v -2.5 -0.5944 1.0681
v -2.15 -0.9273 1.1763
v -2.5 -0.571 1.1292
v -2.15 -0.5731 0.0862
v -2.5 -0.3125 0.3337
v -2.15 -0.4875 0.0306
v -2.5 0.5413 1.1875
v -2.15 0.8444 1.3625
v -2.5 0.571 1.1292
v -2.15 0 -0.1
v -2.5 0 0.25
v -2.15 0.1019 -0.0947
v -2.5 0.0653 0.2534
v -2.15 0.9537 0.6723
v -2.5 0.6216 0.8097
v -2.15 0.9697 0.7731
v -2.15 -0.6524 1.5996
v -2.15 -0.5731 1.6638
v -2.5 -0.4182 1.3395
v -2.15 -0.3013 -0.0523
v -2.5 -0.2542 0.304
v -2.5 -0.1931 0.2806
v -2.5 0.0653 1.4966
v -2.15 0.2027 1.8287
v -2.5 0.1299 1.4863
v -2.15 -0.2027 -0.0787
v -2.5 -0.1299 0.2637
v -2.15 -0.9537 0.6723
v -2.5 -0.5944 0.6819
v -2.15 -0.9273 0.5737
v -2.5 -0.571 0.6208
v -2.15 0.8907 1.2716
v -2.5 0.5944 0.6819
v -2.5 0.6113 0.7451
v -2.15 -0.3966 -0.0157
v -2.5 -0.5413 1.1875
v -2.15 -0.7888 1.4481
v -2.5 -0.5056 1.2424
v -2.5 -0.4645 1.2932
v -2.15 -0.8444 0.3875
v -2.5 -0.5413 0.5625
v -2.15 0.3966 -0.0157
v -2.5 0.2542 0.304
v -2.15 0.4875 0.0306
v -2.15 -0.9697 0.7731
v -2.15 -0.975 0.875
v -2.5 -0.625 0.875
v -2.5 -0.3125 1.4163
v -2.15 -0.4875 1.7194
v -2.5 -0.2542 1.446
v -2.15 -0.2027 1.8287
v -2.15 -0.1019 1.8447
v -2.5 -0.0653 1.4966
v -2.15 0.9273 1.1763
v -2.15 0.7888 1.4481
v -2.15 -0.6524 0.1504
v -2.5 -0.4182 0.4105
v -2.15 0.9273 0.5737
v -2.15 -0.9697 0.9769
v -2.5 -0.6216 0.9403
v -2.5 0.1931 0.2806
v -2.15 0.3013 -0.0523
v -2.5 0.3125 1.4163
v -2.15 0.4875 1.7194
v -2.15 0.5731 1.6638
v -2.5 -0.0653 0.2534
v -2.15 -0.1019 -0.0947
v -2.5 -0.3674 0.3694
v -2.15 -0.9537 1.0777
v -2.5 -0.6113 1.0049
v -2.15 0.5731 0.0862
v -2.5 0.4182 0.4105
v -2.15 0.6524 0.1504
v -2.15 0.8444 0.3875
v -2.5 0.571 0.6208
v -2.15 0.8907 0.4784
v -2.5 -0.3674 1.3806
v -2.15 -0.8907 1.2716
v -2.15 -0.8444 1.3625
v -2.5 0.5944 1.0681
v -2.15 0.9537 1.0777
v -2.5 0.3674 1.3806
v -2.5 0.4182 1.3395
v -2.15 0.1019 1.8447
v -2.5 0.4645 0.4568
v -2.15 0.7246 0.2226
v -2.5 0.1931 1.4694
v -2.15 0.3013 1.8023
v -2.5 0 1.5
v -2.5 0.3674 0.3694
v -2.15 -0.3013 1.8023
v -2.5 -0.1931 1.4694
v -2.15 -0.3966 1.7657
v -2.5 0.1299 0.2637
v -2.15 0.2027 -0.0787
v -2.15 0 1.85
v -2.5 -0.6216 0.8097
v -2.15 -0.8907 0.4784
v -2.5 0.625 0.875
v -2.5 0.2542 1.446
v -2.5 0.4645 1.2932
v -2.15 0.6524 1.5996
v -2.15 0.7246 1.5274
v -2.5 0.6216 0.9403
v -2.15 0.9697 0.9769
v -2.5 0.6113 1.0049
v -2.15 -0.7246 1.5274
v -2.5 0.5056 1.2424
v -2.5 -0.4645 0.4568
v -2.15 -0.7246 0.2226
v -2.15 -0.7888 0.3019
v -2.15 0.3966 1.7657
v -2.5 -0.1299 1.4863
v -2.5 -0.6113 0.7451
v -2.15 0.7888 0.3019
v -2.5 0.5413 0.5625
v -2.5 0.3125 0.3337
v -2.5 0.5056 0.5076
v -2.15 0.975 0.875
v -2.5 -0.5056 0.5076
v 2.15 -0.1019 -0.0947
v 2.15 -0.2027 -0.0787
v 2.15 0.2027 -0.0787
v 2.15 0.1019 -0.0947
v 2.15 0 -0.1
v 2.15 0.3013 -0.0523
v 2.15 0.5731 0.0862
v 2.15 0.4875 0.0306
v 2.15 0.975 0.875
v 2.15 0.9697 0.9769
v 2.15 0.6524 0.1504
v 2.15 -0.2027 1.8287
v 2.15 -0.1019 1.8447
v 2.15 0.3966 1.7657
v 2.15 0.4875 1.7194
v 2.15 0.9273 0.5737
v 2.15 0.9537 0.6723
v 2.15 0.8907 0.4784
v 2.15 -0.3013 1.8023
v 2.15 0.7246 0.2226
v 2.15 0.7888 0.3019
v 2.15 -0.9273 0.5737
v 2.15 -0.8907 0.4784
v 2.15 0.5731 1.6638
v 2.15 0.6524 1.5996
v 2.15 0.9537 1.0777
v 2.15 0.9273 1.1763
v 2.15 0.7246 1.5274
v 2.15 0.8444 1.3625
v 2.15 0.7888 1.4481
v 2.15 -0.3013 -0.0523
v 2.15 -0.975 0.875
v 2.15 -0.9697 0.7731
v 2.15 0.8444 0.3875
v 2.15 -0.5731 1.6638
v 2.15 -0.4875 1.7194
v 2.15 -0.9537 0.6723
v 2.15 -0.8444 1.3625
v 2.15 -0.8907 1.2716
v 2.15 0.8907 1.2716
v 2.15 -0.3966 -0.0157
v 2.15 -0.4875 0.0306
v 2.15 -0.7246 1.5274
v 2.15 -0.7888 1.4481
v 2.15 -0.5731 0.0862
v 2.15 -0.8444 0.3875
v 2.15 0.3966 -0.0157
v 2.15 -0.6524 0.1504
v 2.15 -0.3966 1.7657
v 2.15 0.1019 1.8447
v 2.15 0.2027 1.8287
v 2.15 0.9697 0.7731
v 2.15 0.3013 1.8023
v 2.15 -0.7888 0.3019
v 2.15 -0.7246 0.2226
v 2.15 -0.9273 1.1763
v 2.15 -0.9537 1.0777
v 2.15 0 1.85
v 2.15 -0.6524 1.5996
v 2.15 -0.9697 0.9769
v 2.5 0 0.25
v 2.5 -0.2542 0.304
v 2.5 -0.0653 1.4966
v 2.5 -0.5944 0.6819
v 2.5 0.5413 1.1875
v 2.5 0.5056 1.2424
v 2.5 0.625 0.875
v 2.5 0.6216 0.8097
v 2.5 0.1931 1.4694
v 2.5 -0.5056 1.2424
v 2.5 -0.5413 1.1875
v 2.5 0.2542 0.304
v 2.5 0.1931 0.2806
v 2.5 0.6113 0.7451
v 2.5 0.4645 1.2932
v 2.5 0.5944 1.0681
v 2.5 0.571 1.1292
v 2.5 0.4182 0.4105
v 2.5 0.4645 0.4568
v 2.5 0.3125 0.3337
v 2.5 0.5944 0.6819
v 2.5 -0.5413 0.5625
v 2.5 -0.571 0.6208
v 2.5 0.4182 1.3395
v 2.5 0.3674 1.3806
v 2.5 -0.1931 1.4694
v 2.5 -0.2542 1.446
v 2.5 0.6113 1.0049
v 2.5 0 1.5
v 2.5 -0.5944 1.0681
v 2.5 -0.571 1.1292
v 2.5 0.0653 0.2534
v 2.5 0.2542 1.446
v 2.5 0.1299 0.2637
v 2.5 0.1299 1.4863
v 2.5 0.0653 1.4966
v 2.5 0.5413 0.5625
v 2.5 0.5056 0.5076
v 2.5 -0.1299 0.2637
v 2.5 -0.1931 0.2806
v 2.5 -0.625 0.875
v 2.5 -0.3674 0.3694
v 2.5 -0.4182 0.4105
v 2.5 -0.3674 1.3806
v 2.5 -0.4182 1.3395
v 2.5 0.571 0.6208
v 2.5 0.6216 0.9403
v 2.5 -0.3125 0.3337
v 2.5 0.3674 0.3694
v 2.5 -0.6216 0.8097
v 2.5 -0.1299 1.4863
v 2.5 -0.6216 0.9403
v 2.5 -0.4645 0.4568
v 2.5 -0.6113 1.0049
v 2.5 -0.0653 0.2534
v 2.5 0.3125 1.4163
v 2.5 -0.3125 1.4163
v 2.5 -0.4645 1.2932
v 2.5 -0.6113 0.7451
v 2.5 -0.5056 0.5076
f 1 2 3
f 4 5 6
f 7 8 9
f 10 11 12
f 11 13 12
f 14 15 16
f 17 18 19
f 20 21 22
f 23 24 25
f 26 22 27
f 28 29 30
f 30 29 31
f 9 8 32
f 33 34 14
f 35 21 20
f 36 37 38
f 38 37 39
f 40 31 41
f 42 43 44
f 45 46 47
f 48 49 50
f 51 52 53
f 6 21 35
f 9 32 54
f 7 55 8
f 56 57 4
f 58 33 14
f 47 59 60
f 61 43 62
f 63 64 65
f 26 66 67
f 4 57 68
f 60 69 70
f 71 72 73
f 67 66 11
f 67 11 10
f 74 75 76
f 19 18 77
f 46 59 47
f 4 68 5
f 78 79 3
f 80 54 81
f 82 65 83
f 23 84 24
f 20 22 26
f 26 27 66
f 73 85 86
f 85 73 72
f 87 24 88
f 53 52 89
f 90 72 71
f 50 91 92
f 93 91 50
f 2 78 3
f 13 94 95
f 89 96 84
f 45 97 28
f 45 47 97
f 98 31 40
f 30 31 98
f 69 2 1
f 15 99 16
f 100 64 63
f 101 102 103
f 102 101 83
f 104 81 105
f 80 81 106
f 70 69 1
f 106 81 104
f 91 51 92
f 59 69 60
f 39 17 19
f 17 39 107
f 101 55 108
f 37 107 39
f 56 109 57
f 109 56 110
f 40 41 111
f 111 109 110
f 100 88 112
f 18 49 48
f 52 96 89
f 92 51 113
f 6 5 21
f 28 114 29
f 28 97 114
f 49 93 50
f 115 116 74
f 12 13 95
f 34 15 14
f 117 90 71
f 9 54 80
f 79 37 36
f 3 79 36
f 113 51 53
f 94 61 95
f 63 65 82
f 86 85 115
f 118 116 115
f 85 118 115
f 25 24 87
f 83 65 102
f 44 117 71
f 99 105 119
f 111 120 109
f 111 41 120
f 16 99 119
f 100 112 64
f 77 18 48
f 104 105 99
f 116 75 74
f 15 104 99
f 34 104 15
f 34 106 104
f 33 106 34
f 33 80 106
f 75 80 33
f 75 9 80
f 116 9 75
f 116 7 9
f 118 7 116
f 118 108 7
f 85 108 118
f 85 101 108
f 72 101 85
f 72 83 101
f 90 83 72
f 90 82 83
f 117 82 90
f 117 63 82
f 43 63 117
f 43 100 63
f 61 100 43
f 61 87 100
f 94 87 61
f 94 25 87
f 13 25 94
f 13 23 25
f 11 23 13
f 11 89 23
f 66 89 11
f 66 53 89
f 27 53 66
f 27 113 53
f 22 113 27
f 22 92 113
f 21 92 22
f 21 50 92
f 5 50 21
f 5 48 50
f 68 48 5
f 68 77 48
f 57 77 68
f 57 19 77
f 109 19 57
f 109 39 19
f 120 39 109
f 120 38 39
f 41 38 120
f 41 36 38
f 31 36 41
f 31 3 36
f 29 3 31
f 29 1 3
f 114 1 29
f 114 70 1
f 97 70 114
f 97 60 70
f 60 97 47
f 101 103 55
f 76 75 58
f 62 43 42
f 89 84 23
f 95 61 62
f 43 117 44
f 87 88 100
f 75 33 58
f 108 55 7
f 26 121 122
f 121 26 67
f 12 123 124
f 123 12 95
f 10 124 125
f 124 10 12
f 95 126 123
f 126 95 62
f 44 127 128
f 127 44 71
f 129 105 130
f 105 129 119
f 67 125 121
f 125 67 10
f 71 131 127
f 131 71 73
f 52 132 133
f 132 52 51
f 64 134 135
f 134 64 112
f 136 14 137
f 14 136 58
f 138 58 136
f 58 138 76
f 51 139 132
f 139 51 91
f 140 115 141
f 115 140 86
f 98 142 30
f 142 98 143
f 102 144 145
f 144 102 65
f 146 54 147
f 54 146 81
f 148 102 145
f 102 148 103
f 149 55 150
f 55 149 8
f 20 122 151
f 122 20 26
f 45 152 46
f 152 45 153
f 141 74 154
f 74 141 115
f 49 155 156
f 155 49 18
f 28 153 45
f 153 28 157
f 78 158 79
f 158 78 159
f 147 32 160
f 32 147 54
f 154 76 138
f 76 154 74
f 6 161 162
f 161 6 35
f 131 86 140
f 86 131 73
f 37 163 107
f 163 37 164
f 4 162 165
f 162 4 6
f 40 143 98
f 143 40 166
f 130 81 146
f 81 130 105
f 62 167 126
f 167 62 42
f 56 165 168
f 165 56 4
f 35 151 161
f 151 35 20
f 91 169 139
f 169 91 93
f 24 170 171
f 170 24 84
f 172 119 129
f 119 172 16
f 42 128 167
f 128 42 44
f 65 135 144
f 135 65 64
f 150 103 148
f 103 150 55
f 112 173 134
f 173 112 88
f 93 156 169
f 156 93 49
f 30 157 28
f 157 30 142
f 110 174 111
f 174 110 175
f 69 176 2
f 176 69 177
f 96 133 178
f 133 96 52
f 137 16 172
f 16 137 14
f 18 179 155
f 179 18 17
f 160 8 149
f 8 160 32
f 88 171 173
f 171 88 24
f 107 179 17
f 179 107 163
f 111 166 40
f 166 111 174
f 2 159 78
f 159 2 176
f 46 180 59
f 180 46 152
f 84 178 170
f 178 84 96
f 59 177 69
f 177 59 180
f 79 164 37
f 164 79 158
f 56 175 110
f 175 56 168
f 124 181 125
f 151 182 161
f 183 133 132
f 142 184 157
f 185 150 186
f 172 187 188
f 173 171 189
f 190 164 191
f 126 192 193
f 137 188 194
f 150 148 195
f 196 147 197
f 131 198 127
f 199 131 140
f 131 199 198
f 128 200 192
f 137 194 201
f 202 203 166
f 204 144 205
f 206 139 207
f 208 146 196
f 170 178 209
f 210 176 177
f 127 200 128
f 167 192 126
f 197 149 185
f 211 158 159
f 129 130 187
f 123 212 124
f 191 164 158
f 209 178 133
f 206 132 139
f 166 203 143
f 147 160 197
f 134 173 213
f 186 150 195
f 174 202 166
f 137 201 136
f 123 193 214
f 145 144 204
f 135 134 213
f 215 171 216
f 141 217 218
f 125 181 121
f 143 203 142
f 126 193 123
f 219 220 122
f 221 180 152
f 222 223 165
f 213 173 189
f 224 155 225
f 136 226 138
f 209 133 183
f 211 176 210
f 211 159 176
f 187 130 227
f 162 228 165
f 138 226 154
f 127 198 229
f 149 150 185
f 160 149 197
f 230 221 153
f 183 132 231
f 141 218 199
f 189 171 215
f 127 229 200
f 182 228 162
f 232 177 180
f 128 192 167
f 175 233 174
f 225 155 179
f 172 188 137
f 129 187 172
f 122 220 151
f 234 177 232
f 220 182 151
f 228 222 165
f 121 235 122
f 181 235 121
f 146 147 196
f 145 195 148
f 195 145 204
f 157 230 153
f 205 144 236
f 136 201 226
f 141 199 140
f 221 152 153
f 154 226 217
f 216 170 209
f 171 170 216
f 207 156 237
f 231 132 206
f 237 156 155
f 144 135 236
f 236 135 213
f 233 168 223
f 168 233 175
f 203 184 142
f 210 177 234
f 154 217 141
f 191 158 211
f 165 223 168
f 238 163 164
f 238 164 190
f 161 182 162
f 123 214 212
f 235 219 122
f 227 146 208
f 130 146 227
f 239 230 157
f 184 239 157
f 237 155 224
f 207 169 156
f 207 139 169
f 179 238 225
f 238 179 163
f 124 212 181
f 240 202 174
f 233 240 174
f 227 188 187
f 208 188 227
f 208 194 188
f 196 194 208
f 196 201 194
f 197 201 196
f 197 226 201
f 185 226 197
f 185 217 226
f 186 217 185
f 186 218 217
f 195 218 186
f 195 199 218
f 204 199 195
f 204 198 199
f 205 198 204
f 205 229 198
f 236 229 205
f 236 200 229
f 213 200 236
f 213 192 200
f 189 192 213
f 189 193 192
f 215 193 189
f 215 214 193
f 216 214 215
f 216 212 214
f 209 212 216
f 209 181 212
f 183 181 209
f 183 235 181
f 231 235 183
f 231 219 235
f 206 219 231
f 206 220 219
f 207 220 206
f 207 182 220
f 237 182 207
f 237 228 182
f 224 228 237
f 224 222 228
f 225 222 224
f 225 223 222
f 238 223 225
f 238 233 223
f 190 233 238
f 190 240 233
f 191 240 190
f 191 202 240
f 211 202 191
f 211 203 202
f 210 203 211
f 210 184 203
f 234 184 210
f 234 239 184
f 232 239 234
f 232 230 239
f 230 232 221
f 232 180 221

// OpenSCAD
// ============================================================================
// INDEXING DOWEL PIN (Ø 2.0 x 5.0 MM) FOR CAMERA MOUNT LINKAGE (PART 2)
// Units: millimeters (mm) — Print horizontally (flat on side) with 100% infill
// Note: For heavy loads, replace with DIN 7 Ø 2x5 mm steel pin or 2 mm drill shank
// ============================================================================

$fn = 60;

pin_d       = 1.95;  // Nominal Ø 2.0 mm with 0.05 mm radial print clearance
pin_length  = 5.0;   // Seats 3.0 mm deep in Part 2 + protrudes 2.0 mm into indexing holes
chamfer     = 0.35;  // Lead-in end chamfers for smooth insertion

module indexing_pin_2x5() {
    // Oriented horizontally so continuous filament lines run along the pin length
    translate([-pin_length / 2, 0, pin_d / 2 - 0.1])
        rotate([0, 90, 0])
            union() {
                cylinder(d1 = pin_d - 2 * chamfer, d2 = pin_d, h = chamfer);
                translate([0, 0, chamfer])
                    cylinder(d = pin_d, h = pin_length - 2 * chamfer);
                translate([0, 0, pin_length - chamfer])
                    cylinder(d1 = pin_d, d2 = pin_d - 2 * chamfer, h = chamfer);
            }
}

indexing_pin_2x5();
